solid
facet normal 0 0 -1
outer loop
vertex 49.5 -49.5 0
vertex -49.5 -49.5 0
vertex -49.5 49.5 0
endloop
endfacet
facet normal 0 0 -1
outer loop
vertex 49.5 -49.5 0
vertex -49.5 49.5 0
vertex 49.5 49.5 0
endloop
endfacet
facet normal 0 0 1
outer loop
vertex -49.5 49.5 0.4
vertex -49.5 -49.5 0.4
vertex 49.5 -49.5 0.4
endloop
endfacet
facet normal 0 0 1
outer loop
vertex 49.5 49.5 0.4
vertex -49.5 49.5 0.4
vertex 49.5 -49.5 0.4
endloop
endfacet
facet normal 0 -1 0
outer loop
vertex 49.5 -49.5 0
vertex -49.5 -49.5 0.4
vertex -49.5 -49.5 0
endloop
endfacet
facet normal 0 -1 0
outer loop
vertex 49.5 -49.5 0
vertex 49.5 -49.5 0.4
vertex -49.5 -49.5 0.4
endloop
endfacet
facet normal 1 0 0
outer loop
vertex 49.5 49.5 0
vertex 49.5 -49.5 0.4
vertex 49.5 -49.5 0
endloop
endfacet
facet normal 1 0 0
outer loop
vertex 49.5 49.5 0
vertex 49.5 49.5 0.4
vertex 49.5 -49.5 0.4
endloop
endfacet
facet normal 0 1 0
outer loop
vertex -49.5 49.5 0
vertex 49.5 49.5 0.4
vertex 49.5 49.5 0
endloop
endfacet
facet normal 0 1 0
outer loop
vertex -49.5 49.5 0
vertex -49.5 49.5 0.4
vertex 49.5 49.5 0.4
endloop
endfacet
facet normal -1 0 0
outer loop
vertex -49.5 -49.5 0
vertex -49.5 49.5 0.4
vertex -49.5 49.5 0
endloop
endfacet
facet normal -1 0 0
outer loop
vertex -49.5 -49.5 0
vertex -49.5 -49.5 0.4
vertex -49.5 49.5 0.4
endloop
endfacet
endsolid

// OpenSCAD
/* 
 * Based on Customizable Lithopane http://www.thingiverse.com/thing:74322
 * 
 * Added ability to remove hook hole and specify border sizes
 * Fixed X/Y size to match surface() returned size and added smidgen to difference.
 *
 */

// preview[view:south, tilt:top]

/* [Image] */

// Load a 100x100 pixel image.(images will be stretched to fit) Simple photos work best. Don't forget to click the Invert Colors checkbox!
image_file = "image-surface.dat"; // [image_surface:100x100]

/* [Adjustments] */
// Set both hole values to zero for no hole
hole_diameter = 0;
hole_border = 0;
// Zero for no border
lithophane_border = 0;

// What layer height will you slice this at?  The thinner the better.
layer_height = 0.2;

// The lower the layer height, the more layers you can use.
number_of_layers = 12; // [5:20]

/* [Hidden] */
s=0.01;
length = 99; // surface() produces a n-1 object
width = 99;  // bug in surface drops last line

// base (white) will always be 2 layers thick
min_layer_height = layer_height*2;
hole_radius = hole_diameter/2;
height = layer_height*number_of_layers;
 
union() {
  // take just the part of surface we want
  difference() {
    translate([0, 0, min_layer_height]) scale([1,1,height]) surface(file=image_file, center=true, convexity=5);
	// -
    translate([0,0,-(height+min_layer_height)]) linear_extrude(height=height+min_layer_height) square([length+s, width+s], center=true);
  } // d
  linear_extrude(height=layer_height*2) square([length+lithophane_border, width+lithophane_border], center=true);

  linear_extrude(height=height+min_layer_height){
	  difference(){
		union(){
	      square([length+lithophane_border, width+lithophane_border], center=true);
		  translate([0, width/2+hole_radius+lithophane_border/2, 0])
		    circle(r=hole_radius+ hole_border);
		} // u
		// -
	    union(){
	      square([length, width], center=true);
		  translate([0, width/2+hole_radius+lithophane_border/2, 0])
	        circle(r=hole_radius);
	    } // u
	  } // d
  } // le
} // u
